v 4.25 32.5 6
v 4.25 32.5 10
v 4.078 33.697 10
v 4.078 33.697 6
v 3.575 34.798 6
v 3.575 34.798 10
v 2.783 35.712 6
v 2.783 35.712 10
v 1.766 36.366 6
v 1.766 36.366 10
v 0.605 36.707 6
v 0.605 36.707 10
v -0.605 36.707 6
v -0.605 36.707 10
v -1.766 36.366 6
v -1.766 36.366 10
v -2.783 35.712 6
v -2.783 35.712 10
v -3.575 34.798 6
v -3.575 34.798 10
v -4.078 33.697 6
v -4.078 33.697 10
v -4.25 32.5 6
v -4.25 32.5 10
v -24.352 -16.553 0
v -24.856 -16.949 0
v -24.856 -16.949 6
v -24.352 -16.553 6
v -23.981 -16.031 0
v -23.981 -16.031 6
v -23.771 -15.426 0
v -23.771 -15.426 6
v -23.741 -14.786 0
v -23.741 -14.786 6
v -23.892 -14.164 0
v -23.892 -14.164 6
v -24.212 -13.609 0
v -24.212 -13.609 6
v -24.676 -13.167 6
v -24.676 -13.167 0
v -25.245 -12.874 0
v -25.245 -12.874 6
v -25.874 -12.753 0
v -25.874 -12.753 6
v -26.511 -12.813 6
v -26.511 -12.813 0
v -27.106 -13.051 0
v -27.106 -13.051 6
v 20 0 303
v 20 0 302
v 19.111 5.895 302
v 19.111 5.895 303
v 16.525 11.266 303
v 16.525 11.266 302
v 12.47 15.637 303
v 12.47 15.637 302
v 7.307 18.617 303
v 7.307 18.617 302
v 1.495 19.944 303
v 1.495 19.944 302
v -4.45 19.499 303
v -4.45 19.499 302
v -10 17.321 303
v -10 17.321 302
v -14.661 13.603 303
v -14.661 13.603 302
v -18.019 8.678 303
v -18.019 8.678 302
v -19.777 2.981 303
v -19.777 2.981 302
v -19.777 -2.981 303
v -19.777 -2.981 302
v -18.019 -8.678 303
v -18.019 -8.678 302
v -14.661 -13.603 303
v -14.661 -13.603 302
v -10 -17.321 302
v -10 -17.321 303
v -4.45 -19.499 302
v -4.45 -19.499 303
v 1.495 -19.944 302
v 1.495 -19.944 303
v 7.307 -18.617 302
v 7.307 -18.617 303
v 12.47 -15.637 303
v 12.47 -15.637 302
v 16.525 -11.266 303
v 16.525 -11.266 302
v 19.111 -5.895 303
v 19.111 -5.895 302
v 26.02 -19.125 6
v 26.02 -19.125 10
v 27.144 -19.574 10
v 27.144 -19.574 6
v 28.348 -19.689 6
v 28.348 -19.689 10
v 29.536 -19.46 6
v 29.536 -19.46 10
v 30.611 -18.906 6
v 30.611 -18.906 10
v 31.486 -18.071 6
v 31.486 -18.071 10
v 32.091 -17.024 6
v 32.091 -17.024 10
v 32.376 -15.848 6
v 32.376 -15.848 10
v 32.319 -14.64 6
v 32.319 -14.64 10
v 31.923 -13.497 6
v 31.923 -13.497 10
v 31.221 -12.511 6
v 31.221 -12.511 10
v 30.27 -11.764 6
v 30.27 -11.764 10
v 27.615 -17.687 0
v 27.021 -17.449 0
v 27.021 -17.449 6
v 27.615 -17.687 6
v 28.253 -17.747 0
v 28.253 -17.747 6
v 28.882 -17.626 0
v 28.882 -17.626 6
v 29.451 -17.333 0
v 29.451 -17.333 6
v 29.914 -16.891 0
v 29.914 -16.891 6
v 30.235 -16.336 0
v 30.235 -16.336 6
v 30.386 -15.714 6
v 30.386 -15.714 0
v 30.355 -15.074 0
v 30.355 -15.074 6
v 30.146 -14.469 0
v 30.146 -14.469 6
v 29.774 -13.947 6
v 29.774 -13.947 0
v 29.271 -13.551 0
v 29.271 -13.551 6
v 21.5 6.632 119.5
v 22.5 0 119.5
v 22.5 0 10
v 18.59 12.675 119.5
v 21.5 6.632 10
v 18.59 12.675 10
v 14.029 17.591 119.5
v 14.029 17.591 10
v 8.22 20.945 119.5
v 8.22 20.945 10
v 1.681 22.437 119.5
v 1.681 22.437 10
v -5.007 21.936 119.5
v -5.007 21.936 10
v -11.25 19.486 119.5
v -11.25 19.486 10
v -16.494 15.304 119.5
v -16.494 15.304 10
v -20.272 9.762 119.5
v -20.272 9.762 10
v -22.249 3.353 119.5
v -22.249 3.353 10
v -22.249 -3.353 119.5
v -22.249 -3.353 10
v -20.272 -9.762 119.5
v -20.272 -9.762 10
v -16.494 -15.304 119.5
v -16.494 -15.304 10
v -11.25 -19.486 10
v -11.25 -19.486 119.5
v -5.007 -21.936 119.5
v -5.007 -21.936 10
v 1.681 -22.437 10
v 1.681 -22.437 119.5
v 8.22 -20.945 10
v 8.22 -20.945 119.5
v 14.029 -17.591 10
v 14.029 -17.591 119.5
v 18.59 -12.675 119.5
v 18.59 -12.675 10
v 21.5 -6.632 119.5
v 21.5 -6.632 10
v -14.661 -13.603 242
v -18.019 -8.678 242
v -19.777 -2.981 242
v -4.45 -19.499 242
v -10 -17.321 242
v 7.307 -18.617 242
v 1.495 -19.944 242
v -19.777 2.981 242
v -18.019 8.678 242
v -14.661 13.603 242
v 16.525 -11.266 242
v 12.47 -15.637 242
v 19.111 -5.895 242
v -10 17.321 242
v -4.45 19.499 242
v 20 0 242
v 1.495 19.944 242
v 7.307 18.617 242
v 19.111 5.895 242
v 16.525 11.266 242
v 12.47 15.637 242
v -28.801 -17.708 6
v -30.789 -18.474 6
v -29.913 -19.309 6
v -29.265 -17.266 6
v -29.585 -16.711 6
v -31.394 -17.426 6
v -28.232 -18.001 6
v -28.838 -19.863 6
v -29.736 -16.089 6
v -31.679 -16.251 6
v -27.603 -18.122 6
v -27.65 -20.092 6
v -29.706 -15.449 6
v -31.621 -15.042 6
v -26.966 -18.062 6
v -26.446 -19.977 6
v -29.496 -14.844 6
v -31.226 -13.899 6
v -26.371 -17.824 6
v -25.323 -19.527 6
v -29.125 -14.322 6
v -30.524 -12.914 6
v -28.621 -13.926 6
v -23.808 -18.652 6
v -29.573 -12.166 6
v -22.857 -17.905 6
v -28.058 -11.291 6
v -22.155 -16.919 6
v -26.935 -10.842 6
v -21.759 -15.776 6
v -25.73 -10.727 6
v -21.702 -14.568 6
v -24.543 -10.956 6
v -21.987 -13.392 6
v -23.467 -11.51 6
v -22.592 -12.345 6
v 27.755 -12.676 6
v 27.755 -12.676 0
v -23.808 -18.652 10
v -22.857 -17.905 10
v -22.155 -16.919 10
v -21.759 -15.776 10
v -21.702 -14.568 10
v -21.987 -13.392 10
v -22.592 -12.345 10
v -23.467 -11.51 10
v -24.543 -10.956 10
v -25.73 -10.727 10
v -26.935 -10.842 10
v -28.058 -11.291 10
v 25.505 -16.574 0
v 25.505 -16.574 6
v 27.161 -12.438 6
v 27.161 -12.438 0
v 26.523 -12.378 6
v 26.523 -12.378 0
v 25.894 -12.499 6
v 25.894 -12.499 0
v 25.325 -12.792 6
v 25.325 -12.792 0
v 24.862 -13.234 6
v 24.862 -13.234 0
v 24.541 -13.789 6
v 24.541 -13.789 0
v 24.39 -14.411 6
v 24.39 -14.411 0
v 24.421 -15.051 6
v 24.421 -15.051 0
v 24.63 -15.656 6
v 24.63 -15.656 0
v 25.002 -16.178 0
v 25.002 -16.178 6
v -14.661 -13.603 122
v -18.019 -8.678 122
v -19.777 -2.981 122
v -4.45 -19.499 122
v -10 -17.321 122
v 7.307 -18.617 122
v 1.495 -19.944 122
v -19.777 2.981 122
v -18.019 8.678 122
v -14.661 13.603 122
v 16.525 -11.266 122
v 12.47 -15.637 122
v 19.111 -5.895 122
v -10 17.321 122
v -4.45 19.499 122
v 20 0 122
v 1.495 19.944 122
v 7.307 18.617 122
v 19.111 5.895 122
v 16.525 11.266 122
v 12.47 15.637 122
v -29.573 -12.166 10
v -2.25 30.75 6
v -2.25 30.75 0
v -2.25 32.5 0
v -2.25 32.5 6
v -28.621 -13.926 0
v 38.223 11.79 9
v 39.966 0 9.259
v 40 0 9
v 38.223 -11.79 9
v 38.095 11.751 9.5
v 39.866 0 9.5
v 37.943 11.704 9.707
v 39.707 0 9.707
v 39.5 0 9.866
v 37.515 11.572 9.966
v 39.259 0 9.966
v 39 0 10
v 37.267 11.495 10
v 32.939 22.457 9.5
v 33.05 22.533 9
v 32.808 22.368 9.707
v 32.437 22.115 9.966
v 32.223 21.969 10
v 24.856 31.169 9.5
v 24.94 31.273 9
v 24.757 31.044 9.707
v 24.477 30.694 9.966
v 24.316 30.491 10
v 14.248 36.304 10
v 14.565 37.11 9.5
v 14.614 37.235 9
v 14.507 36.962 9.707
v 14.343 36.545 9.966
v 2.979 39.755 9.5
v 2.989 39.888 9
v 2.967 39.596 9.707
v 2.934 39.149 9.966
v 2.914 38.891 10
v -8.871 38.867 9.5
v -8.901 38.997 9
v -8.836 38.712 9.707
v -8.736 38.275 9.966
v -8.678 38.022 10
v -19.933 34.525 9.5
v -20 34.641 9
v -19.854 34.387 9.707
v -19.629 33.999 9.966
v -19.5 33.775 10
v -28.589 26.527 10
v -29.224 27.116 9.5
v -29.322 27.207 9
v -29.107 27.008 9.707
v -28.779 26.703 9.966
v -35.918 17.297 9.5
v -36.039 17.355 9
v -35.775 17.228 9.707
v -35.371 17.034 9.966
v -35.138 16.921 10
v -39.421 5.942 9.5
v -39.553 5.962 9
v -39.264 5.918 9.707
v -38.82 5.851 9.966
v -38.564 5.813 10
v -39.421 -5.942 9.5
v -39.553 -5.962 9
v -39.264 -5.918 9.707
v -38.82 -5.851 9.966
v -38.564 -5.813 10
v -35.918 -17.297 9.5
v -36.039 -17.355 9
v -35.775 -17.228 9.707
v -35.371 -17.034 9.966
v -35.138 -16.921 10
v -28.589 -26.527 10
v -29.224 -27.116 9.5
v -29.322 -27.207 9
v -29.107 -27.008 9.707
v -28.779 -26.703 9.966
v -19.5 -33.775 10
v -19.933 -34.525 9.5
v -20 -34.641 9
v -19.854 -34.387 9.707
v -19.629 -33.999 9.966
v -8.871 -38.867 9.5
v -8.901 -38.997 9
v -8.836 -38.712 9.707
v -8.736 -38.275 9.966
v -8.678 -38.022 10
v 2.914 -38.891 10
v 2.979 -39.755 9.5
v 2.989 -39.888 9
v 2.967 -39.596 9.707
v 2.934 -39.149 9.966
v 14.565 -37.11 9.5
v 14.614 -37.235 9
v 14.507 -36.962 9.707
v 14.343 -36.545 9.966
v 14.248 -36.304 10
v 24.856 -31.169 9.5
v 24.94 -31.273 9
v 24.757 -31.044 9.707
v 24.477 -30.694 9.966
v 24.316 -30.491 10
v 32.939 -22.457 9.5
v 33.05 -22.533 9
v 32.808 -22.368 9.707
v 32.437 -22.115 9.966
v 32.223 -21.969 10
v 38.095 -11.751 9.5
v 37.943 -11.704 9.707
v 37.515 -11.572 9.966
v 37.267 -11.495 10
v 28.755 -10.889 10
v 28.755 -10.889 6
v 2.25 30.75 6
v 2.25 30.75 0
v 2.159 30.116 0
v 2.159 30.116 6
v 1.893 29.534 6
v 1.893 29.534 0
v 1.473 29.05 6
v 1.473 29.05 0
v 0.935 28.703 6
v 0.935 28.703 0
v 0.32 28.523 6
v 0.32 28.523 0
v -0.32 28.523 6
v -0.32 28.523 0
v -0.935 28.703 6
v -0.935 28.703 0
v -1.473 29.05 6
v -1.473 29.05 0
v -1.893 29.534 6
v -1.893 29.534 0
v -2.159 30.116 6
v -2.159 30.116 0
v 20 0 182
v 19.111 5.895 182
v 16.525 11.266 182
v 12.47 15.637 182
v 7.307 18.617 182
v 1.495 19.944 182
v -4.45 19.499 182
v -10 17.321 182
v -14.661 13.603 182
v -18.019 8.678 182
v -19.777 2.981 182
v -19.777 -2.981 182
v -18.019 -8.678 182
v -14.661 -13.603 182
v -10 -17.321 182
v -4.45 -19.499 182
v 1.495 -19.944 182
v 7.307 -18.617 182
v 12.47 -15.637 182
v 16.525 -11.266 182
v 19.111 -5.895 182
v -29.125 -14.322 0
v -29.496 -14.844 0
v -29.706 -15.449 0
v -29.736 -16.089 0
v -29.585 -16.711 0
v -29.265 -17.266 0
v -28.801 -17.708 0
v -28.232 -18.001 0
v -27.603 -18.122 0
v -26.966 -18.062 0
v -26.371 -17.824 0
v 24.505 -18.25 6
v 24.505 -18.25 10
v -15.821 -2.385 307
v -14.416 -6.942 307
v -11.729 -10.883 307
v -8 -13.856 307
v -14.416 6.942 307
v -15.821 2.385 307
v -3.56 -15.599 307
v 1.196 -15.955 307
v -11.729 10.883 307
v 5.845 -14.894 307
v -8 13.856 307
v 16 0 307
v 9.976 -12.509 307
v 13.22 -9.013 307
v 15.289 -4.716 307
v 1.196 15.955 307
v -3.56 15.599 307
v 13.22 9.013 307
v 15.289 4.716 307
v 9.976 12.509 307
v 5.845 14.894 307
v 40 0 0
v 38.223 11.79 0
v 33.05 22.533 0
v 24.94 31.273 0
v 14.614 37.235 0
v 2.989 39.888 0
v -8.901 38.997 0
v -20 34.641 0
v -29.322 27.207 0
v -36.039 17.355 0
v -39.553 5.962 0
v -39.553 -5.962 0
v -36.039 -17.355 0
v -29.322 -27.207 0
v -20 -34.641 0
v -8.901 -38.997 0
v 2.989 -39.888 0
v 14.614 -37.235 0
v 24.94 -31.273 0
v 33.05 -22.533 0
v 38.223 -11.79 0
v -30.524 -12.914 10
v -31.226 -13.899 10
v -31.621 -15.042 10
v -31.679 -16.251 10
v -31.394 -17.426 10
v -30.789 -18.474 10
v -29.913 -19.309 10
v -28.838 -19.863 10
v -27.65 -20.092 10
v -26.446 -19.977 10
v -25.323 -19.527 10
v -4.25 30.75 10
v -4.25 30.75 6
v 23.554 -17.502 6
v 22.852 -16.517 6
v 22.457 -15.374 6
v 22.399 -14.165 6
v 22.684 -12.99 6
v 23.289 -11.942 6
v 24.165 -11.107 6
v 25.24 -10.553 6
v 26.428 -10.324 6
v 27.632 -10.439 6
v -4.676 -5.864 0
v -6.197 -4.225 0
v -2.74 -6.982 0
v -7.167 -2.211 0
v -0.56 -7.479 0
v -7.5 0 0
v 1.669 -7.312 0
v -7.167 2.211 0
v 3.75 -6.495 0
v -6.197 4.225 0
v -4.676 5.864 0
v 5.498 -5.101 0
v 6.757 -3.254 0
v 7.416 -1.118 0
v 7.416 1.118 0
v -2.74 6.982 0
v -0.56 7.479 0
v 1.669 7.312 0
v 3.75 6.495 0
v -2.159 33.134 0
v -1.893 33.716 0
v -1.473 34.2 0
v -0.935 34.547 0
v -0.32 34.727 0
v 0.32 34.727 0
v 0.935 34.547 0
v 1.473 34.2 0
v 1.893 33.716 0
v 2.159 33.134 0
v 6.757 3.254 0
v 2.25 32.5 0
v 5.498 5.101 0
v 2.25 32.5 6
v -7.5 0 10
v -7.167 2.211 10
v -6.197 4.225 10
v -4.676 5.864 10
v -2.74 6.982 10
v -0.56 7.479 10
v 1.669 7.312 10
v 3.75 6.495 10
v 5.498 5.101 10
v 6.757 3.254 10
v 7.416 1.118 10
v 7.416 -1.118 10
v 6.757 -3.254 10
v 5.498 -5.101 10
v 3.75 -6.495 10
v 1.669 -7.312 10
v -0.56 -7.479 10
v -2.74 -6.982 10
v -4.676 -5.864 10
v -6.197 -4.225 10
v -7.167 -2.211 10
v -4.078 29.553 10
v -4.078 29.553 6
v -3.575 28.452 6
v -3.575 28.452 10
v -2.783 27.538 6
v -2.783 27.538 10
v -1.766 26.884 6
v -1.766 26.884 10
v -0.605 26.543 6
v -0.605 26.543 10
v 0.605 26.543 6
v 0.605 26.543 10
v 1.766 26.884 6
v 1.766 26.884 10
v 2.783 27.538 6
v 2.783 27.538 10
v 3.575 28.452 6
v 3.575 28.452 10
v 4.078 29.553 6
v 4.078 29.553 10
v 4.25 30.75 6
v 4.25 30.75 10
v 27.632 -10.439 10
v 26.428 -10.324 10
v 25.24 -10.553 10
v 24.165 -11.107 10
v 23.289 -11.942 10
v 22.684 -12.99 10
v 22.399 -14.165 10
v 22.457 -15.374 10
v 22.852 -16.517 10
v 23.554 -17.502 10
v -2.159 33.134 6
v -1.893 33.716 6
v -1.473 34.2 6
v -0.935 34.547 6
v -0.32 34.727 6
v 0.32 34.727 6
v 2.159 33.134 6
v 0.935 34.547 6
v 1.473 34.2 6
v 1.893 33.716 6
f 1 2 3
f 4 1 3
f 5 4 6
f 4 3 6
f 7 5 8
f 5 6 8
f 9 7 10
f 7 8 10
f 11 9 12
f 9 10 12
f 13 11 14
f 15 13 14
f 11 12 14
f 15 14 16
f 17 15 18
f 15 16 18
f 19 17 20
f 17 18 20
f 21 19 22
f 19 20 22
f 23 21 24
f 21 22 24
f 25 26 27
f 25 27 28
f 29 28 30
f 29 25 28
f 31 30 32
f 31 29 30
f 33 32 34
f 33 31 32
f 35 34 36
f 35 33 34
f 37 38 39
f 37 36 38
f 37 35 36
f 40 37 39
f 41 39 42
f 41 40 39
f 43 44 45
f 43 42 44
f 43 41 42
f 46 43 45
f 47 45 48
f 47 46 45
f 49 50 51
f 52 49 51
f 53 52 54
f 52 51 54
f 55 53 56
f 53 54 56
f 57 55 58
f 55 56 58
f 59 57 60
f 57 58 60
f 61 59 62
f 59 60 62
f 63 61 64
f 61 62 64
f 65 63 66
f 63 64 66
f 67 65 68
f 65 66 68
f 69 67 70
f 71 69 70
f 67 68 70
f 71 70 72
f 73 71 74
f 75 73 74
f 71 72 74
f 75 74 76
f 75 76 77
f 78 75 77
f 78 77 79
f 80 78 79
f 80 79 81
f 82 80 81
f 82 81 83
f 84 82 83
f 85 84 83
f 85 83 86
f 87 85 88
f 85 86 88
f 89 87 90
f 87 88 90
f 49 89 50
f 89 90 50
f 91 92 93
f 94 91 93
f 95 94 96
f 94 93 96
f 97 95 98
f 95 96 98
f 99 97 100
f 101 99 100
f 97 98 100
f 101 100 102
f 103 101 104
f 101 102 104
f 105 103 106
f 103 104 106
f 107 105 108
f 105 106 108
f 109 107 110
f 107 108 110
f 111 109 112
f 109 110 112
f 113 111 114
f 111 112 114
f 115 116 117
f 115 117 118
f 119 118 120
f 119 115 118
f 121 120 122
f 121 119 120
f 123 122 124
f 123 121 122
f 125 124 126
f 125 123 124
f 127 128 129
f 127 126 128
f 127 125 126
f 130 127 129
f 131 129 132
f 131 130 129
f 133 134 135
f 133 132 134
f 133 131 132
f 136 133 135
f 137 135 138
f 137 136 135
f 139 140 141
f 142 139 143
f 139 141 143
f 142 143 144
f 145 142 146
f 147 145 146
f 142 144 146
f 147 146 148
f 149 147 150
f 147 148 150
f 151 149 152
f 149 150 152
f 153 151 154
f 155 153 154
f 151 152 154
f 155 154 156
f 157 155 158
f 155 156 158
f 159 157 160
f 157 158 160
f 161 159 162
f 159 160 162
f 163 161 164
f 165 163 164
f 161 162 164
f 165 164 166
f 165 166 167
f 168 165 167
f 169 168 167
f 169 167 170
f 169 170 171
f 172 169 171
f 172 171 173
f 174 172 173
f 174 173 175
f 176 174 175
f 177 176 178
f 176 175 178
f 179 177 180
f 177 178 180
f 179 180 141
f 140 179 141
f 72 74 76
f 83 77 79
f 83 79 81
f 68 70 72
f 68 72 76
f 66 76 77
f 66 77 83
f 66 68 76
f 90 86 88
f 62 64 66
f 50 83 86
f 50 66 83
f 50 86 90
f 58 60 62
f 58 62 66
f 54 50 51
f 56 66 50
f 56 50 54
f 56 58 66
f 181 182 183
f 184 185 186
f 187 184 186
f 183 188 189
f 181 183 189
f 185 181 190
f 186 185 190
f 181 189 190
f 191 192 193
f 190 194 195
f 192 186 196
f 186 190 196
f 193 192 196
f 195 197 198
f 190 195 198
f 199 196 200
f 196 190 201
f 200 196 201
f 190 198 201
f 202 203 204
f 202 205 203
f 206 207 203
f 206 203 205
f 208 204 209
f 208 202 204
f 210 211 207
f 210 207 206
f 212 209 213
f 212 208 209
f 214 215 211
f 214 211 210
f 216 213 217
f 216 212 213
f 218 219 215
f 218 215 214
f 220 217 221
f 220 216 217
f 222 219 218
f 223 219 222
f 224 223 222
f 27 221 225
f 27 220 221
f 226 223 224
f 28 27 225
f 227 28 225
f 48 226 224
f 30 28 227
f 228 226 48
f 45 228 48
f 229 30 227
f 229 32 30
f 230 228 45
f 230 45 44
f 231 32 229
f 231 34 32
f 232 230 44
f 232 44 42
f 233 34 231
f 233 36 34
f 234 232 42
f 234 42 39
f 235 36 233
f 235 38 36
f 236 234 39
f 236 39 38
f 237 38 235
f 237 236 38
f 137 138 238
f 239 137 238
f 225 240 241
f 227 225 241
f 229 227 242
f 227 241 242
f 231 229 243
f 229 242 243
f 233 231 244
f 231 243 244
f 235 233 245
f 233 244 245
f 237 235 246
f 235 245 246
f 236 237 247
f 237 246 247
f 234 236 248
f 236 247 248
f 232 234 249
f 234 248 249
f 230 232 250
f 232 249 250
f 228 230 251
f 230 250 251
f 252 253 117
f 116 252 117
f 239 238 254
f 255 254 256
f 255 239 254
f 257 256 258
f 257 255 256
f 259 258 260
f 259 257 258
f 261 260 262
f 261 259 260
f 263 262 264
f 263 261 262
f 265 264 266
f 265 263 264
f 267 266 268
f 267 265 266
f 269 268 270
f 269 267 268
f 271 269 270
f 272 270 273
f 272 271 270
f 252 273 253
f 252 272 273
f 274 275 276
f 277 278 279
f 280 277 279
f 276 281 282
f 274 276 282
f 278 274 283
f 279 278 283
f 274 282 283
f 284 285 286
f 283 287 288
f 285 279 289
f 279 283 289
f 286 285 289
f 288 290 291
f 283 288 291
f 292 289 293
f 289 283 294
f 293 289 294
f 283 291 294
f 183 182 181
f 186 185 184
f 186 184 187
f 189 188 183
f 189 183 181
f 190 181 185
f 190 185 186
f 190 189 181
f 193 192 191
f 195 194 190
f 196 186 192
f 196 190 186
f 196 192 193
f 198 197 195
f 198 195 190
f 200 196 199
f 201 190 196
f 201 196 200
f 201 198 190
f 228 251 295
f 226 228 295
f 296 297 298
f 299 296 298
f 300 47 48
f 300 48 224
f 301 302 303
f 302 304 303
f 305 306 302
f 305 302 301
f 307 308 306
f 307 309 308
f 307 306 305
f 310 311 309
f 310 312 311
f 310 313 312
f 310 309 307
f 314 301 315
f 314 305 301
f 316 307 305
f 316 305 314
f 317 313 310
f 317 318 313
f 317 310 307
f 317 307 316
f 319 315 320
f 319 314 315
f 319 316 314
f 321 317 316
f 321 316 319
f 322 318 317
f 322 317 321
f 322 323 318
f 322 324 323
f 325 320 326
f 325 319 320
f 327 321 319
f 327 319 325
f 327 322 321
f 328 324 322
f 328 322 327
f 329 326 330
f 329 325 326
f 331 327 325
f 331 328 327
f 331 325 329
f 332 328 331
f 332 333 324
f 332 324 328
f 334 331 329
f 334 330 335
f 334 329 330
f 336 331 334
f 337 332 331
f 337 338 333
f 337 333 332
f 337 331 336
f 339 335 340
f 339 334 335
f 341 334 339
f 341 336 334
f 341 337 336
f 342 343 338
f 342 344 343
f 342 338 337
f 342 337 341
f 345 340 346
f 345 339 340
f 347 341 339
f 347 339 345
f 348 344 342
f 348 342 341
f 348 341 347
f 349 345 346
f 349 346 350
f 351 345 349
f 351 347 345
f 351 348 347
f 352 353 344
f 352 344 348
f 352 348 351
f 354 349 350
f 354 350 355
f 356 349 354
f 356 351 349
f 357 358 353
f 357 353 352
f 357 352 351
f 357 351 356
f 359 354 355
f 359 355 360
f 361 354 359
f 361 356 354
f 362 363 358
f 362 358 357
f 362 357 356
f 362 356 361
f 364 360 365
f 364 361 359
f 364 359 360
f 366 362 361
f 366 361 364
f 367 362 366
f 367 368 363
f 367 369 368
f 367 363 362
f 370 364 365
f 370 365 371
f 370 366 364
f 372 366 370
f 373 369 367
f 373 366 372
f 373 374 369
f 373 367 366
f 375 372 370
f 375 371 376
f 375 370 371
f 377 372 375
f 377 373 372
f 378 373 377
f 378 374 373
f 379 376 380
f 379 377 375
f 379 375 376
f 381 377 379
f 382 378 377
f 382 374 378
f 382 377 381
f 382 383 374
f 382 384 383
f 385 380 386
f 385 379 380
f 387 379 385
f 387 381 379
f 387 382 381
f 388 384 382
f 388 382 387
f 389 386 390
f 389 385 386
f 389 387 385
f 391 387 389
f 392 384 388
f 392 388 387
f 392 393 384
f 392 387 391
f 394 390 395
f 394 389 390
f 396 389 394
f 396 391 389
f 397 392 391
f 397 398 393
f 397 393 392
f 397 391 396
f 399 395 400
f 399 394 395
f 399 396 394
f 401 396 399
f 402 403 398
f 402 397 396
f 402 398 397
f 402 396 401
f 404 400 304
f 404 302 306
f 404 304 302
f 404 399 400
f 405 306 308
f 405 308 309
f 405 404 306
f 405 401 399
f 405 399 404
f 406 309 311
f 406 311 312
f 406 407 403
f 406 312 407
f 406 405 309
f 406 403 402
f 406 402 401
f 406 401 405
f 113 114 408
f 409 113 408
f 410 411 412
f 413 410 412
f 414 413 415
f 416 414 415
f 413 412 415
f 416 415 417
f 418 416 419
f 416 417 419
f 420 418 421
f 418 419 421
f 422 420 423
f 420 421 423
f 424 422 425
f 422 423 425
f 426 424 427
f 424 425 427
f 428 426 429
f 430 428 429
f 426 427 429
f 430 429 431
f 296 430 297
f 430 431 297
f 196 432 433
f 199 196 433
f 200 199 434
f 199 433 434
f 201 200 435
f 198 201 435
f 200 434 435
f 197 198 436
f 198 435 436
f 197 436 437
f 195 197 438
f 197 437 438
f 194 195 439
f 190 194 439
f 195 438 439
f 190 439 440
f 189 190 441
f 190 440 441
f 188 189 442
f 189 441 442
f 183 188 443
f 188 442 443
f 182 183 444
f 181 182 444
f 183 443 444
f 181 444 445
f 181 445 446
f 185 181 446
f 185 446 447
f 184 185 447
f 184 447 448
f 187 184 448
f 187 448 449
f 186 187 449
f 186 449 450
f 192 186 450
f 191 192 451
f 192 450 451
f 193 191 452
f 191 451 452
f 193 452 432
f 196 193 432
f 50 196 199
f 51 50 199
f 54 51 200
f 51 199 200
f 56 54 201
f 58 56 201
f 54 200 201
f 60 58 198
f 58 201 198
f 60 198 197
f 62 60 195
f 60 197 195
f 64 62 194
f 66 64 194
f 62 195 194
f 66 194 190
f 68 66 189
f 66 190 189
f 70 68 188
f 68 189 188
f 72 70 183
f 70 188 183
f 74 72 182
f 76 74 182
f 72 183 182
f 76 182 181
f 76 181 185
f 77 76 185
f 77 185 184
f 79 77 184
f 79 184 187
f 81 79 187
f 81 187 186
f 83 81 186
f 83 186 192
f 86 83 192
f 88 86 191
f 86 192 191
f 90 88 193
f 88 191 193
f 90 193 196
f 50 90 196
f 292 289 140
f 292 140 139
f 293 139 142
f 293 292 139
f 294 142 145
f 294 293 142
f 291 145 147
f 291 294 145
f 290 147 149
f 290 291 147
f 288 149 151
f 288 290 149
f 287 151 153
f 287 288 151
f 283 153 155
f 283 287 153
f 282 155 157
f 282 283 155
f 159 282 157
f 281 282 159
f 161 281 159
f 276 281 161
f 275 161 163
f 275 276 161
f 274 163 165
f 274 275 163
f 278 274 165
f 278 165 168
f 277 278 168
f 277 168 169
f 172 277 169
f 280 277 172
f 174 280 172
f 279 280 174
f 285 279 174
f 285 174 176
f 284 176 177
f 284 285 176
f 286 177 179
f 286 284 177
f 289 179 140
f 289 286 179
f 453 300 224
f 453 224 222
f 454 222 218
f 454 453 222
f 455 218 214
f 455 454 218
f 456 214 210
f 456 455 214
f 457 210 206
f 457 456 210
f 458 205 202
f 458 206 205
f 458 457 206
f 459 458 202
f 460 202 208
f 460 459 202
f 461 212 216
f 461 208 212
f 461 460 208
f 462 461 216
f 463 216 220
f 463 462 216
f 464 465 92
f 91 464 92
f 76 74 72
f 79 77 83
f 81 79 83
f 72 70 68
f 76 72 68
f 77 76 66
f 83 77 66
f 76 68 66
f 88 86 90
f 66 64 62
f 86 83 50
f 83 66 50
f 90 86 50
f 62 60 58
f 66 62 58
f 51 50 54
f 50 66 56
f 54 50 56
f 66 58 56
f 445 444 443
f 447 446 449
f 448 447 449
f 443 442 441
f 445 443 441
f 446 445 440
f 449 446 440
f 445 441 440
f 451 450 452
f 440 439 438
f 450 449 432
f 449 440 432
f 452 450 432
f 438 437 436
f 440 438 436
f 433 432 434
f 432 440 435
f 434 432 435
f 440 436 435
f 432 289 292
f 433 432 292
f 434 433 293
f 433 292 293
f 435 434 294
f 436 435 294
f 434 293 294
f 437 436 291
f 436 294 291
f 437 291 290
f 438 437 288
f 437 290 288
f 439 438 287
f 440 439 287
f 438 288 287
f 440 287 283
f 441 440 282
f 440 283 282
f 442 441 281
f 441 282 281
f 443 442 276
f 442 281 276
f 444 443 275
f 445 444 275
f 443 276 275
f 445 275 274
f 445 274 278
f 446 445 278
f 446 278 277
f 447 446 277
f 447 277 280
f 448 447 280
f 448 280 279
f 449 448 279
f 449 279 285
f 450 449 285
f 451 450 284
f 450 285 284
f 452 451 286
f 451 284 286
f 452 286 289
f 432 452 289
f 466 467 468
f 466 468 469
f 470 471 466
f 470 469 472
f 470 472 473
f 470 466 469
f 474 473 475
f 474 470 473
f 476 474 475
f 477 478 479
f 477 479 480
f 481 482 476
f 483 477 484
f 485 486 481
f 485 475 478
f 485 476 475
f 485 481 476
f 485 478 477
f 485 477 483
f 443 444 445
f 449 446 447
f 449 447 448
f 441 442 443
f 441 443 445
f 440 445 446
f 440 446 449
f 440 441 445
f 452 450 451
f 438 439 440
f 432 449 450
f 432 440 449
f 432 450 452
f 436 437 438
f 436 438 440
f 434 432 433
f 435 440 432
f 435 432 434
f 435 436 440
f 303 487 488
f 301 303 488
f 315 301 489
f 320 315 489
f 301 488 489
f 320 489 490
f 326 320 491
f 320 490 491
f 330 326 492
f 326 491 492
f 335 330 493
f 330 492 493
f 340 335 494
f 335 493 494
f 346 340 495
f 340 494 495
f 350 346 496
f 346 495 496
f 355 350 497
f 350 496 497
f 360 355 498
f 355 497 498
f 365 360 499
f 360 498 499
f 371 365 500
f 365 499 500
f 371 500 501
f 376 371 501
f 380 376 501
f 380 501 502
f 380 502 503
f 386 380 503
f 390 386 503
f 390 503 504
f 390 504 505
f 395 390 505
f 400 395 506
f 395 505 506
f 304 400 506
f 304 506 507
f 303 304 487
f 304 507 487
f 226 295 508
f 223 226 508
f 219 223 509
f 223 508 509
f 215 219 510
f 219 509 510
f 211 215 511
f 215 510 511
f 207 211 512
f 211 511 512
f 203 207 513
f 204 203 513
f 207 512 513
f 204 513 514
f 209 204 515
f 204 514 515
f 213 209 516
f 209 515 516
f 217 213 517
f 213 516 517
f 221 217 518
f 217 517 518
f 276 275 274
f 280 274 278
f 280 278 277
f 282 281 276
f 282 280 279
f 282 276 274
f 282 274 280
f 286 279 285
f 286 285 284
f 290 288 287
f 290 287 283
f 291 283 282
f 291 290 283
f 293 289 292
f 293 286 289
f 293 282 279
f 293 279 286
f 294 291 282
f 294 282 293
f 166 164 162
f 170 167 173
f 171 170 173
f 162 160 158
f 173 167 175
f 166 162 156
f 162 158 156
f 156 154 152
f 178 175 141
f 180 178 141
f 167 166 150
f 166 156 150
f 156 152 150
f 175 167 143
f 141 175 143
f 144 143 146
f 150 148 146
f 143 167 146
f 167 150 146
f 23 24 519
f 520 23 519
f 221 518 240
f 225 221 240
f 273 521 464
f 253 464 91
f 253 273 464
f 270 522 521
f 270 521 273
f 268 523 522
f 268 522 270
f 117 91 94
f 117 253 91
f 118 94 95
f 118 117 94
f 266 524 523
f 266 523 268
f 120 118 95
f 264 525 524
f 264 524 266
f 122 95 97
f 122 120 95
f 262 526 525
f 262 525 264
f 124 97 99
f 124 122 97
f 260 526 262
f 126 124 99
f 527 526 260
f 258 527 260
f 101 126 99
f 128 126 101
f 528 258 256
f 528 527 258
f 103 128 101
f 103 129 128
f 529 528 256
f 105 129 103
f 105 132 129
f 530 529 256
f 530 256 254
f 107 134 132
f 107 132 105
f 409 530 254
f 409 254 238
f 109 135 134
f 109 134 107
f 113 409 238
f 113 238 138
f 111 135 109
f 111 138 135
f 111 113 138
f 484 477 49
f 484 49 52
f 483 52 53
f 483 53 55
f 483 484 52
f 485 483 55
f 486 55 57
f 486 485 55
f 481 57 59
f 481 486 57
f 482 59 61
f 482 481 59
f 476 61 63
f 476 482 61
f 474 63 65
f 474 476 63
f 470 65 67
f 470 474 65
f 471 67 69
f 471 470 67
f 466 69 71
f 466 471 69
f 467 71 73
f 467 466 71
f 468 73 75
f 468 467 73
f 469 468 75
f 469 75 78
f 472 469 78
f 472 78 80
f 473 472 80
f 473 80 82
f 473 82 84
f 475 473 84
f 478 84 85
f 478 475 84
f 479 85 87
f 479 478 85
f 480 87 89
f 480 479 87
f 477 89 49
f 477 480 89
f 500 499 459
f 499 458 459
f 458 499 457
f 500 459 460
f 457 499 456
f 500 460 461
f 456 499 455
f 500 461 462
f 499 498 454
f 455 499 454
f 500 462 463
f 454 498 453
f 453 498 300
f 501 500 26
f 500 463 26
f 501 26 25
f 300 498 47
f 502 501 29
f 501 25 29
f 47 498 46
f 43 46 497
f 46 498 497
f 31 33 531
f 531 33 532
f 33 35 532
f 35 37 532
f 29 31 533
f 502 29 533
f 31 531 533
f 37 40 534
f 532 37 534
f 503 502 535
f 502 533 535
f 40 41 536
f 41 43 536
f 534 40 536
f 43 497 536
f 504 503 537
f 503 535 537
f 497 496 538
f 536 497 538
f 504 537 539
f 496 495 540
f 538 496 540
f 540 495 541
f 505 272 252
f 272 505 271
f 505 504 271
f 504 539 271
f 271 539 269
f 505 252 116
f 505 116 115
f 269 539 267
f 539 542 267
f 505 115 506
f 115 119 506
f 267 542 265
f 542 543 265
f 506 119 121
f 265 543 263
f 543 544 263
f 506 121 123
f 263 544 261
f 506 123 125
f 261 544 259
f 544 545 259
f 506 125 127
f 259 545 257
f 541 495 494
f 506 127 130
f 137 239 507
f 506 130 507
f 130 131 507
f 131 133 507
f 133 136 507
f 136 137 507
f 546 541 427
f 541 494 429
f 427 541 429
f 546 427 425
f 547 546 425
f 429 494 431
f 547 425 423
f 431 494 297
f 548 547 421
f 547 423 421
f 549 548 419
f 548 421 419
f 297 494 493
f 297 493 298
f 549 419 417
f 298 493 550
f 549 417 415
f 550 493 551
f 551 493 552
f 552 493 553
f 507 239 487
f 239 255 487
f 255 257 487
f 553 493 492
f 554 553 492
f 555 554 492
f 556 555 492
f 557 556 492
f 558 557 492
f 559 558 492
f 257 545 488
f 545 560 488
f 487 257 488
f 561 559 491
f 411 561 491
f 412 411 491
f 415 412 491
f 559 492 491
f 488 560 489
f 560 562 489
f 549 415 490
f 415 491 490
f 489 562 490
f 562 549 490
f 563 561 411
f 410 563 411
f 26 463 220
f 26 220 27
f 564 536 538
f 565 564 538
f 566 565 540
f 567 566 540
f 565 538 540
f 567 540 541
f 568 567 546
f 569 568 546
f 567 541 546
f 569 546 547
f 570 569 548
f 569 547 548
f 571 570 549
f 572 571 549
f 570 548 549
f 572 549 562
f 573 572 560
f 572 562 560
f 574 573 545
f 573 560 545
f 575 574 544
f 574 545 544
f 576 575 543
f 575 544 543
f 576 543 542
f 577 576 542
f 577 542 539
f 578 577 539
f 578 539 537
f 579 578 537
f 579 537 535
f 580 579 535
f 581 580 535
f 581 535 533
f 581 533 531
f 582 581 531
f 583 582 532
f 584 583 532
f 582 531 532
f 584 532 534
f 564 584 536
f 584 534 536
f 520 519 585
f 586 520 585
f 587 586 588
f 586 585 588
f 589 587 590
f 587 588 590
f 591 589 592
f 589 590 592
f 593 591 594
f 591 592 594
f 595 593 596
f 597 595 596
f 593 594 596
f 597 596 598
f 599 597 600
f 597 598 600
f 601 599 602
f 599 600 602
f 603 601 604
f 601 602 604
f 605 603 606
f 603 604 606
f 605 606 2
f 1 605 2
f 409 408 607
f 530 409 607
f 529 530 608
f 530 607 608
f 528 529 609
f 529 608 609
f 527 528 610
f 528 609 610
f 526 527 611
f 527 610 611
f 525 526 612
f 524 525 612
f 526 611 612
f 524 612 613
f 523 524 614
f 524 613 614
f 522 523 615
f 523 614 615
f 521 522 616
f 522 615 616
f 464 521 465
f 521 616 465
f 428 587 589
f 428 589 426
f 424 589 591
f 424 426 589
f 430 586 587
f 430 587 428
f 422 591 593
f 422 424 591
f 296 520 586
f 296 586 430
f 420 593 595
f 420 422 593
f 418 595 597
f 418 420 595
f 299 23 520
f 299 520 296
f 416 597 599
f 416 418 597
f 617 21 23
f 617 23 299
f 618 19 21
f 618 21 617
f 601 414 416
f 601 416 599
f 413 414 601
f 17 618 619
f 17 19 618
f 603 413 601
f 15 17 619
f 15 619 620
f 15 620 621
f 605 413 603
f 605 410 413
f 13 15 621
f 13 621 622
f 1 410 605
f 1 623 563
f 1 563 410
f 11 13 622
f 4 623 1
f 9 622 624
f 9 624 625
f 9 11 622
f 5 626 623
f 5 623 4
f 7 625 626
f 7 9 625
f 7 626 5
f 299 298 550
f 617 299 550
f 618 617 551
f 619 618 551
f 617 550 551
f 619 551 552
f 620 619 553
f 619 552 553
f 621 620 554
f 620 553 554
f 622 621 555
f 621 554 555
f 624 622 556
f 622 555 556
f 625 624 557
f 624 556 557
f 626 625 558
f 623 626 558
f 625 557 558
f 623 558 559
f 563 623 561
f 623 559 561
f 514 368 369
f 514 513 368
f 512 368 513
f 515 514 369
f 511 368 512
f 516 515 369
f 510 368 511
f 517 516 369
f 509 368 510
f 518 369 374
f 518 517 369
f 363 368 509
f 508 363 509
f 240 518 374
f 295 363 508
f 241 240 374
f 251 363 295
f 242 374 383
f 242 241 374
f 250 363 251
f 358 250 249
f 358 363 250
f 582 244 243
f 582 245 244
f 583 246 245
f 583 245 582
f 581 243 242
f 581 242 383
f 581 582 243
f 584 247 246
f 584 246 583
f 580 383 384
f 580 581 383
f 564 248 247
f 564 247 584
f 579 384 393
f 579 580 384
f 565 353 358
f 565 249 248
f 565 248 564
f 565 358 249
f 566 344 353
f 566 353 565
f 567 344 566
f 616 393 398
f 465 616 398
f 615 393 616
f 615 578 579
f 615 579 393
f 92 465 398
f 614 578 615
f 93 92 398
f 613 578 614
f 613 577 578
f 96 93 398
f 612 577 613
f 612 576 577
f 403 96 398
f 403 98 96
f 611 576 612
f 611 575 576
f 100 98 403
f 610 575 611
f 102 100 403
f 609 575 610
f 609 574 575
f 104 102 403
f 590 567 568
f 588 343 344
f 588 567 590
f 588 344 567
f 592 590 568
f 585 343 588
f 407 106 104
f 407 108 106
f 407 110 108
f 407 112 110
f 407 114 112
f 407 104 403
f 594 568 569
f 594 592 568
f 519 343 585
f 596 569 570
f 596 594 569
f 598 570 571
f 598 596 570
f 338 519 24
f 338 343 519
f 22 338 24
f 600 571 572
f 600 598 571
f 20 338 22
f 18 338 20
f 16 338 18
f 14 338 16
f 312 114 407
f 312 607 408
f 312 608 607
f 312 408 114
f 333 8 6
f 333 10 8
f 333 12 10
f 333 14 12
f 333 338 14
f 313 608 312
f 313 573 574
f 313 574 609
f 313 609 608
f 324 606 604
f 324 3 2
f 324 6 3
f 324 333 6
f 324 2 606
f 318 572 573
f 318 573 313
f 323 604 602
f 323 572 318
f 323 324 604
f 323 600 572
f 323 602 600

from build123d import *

# Parameters (mm, degrees)
SKETCH_1_R            = 40
EXTRUDE_1_DEPTH       = 10
FILLET_1_R            = 1
CUT_EXTRUDE_1_DEPTH   = 4
SKETCH_3_R            = 22.5
EXTRUDE_2_DEPTH       = 112
SKETCH_4_R            = 20
EXTRUDE_3_DEPTH       = 60
SKETCH_5_R            = 20
EXTRUDE_4_DEPTH       = 60
SKETCH_6_R            = 20
EXTRUDE_5_DEPTH       = 60
SKETCH_7_R            = 20
EXTRUDE_6_DEPTH       = 5
CHAMFER_1_SIZE        = 4
CHAMFER_2_SIZE        = 2.5
SKETCH_1_2_R          = 7.5
CUT_EXTRUDE_1_2_DEPTH = 10


with BuildPart() as part:
    # Sketch 1 → 伸長1 (new body)
    with BuildSketch(Plane.XY):
        Circle(SKETCH_1_R)
        with BuildLine():
            Line((2.25, 32.5), (2.25, 30.75))
            ThreePointArc((2.25, 30.75), (0, 28.5), (-2.25, 30.75))
            Line((-2.25, 30.75), (-2.25, 32.5))
            ThreePointArc((-2.25, 32.5), (0, 34.75), (2.25, 32.5))
        make_face(mode=Mode.SUBTRACT)
        with BuildLine():
            Line((29.270825623, -13.551442841), (27.755281166, -12.676442841))
            ThreePointArc((27.755281166, -12.676442841), (24.681724008, -13.5), (25.505281166, -16.573557159))
            Line((25.505281166, -16.573557159), (27.020825623, -17.448557159))
            ThreePointArc((27.020825623, -17.448557159), (30.094382782, -16.625), (29.270825623, -13.551442841))
        make_face(mode=Mode.SUBTRACT)
        with BuildLine():
            Line((-26.37130657, -17.823557159), (-24.855762114, -16.948557159))
            ThreePointArc((-24.855762114, -16.948557159), (-24.032204955, -13.875), (-27.105762114, -13.051442841))
            Line((-27.105762114, -13.051442841), (-28.62130657, -13.926442841))
            ThreePointArc((-28.62130657, -13.926442841), (-29.444863729, -17), (-26.37130657, -17.823557159))
        make_face(mode=Mode.SUBTRACT)
    extrude(amount=EXTRUDE_1_DEPTH)

    # 圓角1
    fillet_1_edges = [part.edges().sort_by_distance(p)[0] for p in [
        (-40, 0, 10),
    ]]
    fillet(fillet_1_edges, radius=FILLET_1_R)

    # 草圖2 → Cut-Extrude 1 (cut)
    with BuildSketch(Plane.XY.offset(10)):
        with BuildLine():
            Line((24.504931819, -18.249837648), (26.020476275, -19.124837648))
            ThreePointArc((26.020476275, -19.124837648), (31.826084242, -17.569229682), (30.270476275, -11.763621716))
            Line((30.270476275, -11.763621716), (28.754931819, -10.888621716))
            ThreePointArc((28.754931819, -10.888621716), (22.949323853, -12.444229682), (24.504931819, -18.249837648))
        make_face()
        with BuildLine():
            Line((4.25, 30.75), (4.25, 32.5))
            ThreePointArc((4.25, 32.5), (0, 36.75), (-4.25, 32.5))
            Line((-4.25, 32.5), (-4.25, 30.75))
            ThreePointArc((-4.25, 30.75), (0, 26.5), (4.25, 30.75))
        make_face()
        with BuildLine():
            Line((-28.057638275, -11.291204331), (-29.573182732, -12.166204331))
            ThreePointArc((-29.573182732, -12.166204331), (-31.128790698, -17.971812297), (-25.323182732, -19.527420263))
            Line((-25.323182732, -19.527420263), (-23.807638275, -18.652420263))
            ThreePointArc((-23.807638275, -18.652420263), (-22.252030309, -12.846812297), (-28.057638275, -11.291204331))
        make_face()
    extrude(amount=-CUT_EXTRUDE_1_DEPTH, mode=Mode.SUBTRACT)

    # Sketch 1 2 → Cut-Extrude 1 2 (cut)
    with BuildSketch(Plane(origin=(0, 0, 0), x_dir=(-1, 0, 0), z_dir=(0, 0, -1))):
        Circle(SKETCH_1_2_R)
    extrude(amount=-CUT_EXTRUDE_1_2_DEPTH, mode=Mode.SUBTRACT)


with BuildPart() as body_2:
    # 草圖3 → 伸長2 (new body)
    with BuildSketch(Plane.XY.offset(10)):
        Circle(SKETCH_3_R)
    extrude(amount=EXTRUDE_2_DEPTH)

    # 導角2
    chamfer_2_edges = [body_2.edges().sort_by_distance(p)[0] for p in [
        (-22.5, 0, 122),
    ]]
    chamfer(chamfer_2_edges, length=CHAMFER_2_SIZE)


with BuildPart() as body_3:
    # 草圖4 → 伸長3 (new body)
    with BuildSketch(Plane.XY.offset(122)):
        Circle(SKETCH_4_R)
    extrude(amount=EXTRUDE_3_DEPTH)


with BuildPart() as body_4:
    # 草圖5 → 伸長4 (new body)
    with BuildSketch(Plane.XY.offset(182)):
        Circle(SKETCH_5_R)
    extrude(amount=EXTRUDE_4_DEPTH)


with BuildPart() as body_5:
    # 草圖6 → 伸長5 (new body)
    with BuildSketch(Plane.XY.offset(242)):
        Circle(SKETCH_6_R)
    extrude(amount=EXTRUDE_5_DEPTH)


with BuildPart() as body_6:
    # 草圖7 → 伸長6 (new body)
    with BuildSketch(Plane.XY.offset(302)):
        Circle(SKETCH_7_R)
    extrude(amount=EXTRUDE_6_DEPTH)

    # 導角1
    chamfer_1_edges = [body_6.edges().sort_by_distance(p)[0] for p in [
        (-20, 0, 307),
    ]]
    chamfer(chamfer_1_edges, length=CHAMFER_1_SIZE)


solid = Compound([part.part, body_2.part, body_3.part, body_4.part, body_5.part, body_6.part])
